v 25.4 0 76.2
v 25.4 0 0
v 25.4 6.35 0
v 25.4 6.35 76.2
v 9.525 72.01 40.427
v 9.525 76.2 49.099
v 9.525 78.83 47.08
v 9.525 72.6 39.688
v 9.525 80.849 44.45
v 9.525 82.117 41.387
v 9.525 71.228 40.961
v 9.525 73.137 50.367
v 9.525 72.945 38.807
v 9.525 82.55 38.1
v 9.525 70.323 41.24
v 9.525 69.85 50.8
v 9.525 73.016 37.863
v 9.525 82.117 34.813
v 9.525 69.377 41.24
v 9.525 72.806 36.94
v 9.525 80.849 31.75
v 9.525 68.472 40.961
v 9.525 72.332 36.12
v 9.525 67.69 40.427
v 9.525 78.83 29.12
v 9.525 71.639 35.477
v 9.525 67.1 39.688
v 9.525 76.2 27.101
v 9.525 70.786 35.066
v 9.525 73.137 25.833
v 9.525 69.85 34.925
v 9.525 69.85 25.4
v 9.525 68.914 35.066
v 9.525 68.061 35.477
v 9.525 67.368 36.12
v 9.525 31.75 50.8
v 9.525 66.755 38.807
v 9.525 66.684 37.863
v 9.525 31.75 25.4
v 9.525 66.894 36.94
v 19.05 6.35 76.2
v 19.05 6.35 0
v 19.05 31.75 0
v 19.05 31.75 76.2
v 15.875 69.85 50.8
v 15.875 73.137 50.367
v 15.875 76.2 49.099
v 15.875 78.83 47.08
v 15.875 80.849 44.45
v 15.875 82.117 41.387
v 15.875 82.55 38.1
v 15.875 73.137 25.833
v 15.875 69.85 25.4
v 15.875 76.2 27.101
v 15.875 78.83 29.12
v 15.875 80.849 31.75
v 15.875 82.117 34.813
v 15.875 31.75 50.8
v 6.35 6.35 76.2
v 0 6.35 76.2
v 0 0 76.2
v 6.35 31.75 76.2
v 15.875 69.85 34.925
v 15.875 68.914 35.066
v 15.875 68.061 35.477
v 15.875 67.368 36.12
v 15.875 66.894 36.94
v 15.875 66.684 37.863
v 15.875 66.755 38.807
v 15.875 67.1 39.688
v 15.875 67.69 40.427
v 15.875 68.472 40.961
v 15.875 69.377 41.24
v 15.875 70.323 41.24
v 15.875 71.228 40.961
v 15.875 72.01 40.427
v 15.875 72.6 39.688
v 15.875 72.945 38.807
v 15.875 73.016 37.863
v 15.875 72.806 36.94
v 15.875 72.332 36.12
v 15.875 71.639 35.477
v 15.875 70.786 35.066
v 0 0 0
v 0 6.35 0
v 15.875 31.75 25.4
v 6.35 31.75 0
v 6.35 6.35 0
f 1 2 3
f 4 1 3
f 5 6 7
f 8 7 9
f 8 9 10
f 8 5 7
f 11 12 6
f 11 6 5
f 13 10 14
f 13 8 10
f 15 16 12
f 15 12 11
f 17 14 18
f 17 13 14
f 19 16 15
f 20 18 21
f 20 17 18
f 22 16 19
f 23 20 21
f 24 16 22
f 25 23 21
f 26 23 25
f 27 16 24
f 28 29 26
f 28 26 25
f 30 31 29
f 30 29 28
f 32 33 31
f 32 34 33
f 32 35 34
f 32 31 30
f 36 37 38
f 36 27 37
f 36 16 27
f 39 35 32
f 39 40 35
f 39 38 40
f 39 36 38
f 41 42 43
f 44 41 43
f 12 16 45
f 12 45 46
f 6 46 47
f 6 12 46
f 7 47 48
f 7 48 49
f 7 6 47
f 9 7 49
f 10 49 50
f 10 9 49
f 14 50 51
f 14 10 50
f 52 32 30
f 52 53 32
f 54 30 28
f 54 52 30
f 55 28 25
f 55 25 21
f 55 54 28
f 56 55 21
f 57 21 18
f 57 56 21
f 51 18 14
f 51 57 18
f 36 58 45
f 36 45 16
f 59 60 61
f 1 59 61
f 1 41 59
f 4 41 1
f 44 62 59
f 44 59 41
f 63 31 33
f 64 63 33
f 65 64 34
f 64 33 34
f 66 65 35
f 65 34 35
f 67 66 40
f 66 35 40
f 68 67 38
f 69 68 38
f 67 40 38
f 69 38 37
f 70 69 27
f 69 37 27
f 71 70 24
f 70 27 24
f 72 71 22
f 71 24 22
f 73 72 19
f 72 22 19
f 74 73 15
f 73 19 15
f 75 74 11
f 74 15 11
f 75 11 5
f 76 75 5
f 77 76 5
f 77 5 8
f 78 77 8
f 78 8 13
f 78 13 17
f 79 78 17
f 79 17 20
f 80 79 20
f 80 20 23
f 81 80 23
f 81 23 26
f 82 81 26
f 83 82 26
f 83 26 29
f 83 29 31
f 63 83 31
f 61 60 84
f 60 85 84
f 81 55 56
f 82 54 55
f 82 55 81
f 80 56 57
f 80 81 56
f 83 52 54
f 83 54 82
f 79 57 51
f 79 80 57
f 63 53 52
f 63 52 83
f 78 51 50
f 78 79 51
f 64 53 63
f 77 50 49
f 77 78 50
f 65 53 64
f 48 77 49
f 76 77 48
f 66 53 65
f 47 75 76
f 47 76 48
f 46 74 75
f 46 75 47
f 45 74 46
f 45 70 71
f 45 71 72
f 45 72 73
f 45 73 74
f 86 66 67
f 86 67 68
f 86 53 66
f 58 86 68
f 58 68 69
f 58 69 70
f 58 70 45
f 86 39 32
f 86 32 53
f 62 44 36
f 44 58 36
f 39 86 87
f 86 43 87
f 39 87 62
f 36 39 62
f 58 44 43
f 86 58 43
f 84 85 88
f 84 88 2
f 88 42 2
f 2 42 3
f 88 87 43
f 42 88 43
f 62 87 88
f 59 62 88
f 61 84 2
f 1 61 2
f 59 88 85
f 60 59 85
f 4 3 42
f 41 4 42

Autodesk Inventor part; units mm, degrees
ref_plane "YZ Plane" through (0, 0, 0) normal (1, 0, 0) x (0, 1, 0)
ref_plane "XZ Plane" through (0, 0, 0) normal (0, 1, 0) x (-1, 0, 0)
ref_plane "XY Plane" through (0, 0, 0) normal (0, 0, 1) x (1, 0, 0)
sketch "Sketch1" plane through (0, 0, 0) normal (0, 0, 1) x (1, 0, 0)
  line L0 (0, 0) -> (25.4, 0)
  line L1 (25.4, 0) -> (25.4, 6.35)
  line L2 (25.4, 6.35) -> (19.05, 6.35)
  line L3 (19.05, 6.35) -> (19.05, 31.75)
  line L4 (19.05, 31.75) -> (6.35, 31.75)
  line L5 (6.35, 31.75) -> (6.35, 6.35)
  line L6 (6.35, 6.35) -> (0, 6.35)
  line L7 (0, 6.35) -> (0, 0)
  dimension "d0" = 12.7
  dimension "d1" = 6.35
  dimension "d2" = 6.35
  dimension "d3" = 6.35
  dimension "d4" = 25.4
extrude "Extrusion1" add sketch "Sketch1" along normal blind 76.2
sketch "Sketch2" plane through (6.35, 31.75, 0) normal (0, 1, 0) x (1, 0, 0)
  line L0 (9.525, -50.8) -> (3.175, -50.8)
  line L1 (3.175, -50.8) -> (3.175, -25.4)
  line L2 (3.175, -25.4) -> (9.525, -25.4)
  line L3 (9.525, -25.4) -> (9.525, -50.8)
  line L4 (0, 0) -> (0, -76.2) projected
  line L5 (12.7, 0) -> (12.7, -76.2) projected
  line L6 (12.7, -76.2) -> (0, -76.2) projected
  line L7 (12.7, 0) -> (0, 0) projected
  point P0 (-6.35, 0)
  dimension "d7" = 12.7
  dimension "d8" = 3.175
  dimension "d9" = 3.175
  dimension "d10" = 6.35
  dimension "d11" = 76.2
  dimension "d12" = 25.4
  dimension "d13" = 25.4
extrude "Extrusion2" add sketch "Sketch2" along normal blind 50.8 contours L0 L1 L2 L3
fillet "Fillet1" radius 12.7 2 edges at (12.7, 82.55, 50.8) (12.7, 82.55, 25.4)
hole "Hole1" at (15.875, 69.85, 38.1) direction (-1, 0, 0) diameter 6.35 end through all
properties part number "slider"
